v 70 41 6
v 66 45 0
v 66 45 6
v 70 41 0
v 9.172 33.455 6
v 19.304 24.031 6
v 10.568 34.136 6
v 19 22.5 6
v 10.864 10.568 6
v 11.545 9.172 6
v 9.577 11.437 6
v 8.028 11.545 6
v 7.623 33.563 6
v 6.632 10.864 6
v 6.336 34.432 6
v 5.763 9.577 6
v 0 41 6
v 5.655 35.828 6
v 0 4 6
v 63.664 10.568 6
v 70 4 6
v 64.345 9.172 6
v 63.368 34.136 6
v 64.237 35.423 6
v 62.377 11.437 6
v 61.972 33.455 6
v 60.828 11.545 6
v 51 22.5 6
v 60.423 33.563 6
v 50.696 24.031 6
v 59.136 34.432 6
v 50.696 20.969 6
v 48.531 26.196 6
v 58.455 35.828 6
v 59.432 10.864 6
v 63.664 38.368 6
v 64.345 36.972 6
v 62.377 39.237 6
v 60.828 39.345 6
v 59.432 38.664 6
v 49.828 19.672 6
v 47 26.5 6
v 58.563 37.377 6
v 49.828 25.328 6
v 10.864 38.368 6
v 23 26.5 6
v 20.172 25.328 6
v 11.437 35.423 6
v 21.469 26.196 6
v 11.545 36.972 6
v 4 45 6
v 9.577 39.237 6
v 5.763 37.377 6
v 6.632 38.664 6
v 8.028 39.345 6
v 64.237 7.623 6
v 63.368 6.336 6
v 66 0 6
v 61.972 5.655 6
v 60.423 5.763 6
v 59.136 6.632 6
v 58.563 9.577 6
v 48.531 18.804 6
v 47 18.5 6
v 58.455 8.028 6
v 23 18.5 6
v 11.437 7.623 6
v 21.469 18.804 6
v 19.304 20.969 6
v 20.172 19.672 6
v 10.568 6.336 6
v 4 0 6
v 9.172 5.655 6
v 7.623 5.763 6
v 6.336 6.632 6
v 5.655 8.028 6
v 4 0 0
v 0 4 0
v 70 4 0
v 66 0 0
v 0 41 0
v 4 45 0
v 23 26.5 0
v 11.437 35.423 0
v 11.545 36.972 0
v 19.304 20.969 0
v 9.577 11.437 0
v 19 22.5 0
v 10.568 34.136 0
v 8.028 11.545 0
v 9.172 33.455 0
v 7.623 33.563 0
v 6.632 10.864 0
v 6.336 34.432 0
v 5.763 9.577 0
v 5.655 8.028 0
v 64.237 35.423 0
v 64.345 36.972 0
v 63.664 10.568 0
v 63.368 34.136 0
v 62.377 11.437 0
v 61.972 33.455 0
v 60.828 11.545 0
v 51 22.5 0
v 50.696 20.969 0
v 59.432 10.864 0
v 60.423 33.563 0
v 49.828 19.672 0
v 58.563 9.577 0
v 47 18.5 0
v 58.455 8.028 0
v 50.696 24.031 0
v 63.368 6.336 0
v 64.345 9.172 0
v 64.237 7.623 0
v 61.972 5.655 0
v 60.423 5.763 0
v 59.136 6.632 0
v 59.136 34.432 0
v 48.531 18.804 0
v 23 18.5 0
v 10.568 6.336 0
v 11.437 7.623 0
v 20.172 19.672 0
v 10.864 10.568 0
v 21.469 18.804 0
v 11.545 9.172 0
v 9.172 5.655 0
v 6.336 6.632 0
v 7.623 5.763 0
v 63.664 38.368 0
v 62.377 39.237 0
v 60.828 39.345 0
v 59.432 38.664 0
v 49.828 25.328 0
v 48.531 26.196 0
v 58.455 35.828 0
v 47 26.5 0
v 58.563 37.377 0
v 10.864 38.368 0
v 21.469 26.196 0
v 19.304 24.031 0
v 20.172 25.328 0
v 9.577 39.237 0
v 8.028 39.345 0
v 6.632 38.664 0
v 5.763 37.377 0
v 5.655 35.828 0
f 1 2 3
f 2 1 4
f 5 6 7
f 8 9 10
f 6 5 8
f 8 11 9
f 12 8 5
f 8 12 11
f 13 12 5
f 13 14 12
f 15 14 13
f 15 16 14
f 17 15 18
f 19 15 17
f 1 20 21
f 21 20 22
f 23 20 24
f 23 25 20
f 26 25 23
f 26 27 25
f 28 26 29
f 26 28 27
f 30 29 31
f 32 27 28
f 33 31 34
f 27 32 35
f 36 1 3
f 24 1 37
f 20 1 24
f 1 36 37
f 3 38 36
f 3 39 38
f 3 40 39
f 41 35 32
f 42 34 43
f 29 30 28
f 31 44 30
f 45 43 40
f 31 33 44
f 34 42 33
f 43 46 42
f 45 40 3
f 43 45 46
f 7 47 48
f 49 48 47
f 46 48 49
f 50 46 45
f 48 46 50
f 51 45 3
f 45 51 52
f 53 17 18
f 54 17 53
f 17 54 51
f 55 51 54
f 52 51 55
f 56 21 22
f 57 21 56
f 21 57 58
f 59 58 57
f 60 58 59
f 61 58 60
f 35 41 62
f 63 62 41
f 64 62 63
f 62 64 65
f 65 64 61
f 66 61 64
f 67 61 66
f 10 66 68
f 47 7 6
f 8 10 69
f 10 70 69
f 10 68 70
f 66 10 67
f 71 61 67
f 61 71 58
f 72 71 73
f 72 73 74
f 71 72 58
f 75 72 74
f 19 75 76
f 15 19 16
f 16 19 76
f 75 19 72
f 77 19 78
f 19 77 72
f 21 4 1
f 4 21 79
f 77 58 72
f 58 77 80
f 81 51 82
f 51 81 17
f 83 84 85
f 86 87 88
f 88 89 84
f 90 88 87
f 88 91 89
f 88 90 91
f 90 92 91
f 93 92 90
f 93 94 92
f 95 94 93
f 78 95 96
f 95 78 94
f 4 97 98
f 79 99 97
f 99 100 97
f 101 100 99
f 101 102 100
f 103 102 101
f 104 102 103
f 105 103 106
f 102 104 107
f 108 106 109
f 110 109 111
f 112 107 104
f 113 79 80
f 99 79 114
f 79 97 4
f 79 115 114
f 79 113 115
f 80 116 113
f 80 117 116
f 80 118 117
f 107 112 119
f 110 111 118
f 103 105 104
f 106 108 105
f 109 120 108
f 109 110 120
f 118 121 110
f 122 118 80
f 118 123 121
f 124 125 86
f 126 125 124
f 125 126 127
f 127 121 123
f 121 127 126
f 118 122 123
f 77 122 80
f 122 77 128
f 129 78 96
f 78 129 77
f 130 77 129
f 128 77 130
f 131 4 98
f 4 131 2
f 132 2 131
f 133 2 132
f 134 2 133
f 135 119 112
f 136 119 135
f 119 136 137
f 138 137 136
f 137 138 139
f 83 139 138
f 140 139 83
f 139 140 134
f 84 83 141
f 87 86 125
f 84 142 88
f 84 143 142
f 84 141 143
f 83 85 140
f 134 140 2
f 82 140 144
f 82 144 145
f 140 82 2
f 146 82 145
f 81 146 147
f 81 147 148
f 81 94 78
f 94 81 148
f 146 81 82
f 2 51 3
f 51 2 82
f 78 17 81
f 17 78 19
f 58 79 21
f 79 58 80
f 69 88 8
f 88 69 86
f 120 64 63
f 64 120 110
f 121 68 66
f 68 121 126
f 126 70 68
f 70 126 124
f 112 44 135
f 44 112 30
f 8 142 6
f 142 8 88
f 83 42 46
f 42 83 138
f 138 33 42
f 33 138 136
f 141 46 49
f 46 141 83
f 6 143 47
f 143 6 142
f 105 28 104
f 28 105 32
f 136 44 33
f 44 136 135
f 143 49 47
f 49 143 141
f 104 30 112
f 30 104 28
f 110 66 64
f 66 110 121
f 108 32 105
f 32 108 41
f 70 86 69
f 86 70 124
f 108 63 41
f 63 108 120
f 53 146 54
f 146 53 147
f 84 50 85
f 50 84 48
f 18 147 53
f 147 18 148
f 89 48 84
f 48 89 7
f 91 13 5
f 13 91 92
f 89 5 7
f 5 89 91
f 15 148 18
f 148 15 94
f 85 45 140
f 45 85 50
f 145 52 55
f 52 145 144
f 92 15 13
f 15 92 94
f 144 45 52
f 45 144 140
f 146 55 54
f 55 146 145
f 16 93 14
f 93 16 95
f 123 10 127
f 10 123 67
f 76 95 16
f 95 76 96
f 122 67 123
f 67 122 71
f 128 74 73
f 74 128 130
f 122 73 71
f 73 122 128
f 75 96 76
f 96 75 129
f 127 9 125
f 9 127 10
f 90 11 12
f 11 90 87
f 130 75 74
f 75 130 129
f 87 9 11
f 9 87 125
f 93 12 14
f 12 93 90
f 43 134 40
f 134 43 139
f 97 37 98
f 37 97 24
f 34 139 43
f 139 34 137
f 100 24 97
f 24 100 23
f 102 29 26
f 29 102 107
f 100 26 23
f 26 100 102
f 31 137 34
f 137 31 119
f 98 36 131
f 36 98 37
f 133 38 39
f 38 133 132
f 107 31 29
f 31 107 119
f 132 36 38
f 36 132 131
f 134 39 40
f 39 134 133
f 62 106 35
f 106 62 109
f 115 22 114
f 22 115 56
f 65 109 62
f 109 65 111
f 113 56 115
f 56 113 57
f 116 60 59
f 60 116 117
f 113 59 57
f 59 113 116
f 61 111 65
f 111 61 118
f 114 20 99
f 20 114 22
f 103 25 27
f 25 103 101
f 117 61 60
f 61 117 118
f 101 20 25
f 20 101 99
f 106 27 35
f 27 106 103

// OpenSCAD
$fn = 32;

// ----------------------------------------------------------------------
// Bracket plate: slot plate 70 x 45
// ----------------------------------------------------------------------

// --- parameters (mm) ---
hole_r = 3;               // bolt hole radius
plate_t = 6;              // plate thickness, Z (extrusion height)
plate_l = 70;             // plate length
plate_w = 45;             // plate width
slot_l = 24;              // slot straight length
slot_r = 4;               // slot end radius

slot_len = slot_l + 2 * slot_r;
slot_w = 2 * slot_r;
hole_d2 = 2 * hole_r;

profile = [[4, 0], [66, 0], [70, 4], [70, 41], [66, 45], [4, 45], [0, 41], [0, 4]];  // primary outline, 8 points, counter clockwise
void_1 = [[47, 18.5], [48.531, 18.804], [49.828, 19.672], [50.696, 20.969], [51, 22.5], [50.696, 24.031], [49.828, 25.328], [48.531, 26.196], [47, 26.5], [23, 26.5], [21.469, 26.196], [20.172, 25.328], [19.304, 24.031], [19, 22.5], [19.304, 20.969], [20.172, 19.672], [21.469, 18.804], [23, 18.5]];  // grip slot, 18 points
void_2 = [[11.545, 36.972], [10.864, 38.368], [9.577, 39.237], [8.028, 39.345], [6.632, 38.664], [5.763, 37.377], [5.655, 35.828], [6.336, 34.432], [7.623, 33.563], [9.172, 33.455], [10.568, 34.136], [11.437, 35.423]];  // corner hole, 12 points
void_3 = [[11.545, 9.172], [10.864, 10.568], [9.577, 11.437], [8.028, 11.545], [6.632, 10.864], [5.763, 9.577], [5.655, 8.028], [6.336, 6.632], [7.623, 5.763], [9.172, 5.655], [10.568, 6.336], [11.437, 7.623]];  // corner hole, 12 points
void_4 = [[64.345, 36.972], [63.664, 38.368], [62.377, 39.237], [60.828, 39.345], [59.432, 38.664], [58.563, 37.377], [58.455, 35.828], [59.136, 34.432], [60.423, 33.563], [61.972, 33.455], [63.368, 34.136], [64.237, 35.423]];  // corner hole, 12 points
void_5 = [[64.345, 9.172], [63.664, 10.568], [62.377, 11.437], [60.828, 11.545], [59.432, 10.864], [58.563, 9.577], [58.455, 8.028], [59.136, 6.632], [60.423, 5.763], [61.972, 5.655], [63.368, 6.336], [64.237, 7.623]];  // corner hole, 12 points

// --- the one profile operation ---
difference() {
  linear_extrude(height = plate_t) polygon(points = profile);
  translate([0, 0, -1])
    linear_extrude(height = plate_t + 2) polygon(points = void_1);
  translate([0, 0, -1])
    linear_extrude(height = plate_t + 2) polygon(points = void_2);
  translate([0, 0, -1])
    linear_extrude(height = plate_t + 2) polygon(points = void_3);
  translate([0, 0, -1])
    linear_extrude(height = plate_t + 2) polygon(points = void_4);
  translate([0, 0, -1])
    linear_extrude(height = plate_t + 2) polygon(points = void_5);
}
